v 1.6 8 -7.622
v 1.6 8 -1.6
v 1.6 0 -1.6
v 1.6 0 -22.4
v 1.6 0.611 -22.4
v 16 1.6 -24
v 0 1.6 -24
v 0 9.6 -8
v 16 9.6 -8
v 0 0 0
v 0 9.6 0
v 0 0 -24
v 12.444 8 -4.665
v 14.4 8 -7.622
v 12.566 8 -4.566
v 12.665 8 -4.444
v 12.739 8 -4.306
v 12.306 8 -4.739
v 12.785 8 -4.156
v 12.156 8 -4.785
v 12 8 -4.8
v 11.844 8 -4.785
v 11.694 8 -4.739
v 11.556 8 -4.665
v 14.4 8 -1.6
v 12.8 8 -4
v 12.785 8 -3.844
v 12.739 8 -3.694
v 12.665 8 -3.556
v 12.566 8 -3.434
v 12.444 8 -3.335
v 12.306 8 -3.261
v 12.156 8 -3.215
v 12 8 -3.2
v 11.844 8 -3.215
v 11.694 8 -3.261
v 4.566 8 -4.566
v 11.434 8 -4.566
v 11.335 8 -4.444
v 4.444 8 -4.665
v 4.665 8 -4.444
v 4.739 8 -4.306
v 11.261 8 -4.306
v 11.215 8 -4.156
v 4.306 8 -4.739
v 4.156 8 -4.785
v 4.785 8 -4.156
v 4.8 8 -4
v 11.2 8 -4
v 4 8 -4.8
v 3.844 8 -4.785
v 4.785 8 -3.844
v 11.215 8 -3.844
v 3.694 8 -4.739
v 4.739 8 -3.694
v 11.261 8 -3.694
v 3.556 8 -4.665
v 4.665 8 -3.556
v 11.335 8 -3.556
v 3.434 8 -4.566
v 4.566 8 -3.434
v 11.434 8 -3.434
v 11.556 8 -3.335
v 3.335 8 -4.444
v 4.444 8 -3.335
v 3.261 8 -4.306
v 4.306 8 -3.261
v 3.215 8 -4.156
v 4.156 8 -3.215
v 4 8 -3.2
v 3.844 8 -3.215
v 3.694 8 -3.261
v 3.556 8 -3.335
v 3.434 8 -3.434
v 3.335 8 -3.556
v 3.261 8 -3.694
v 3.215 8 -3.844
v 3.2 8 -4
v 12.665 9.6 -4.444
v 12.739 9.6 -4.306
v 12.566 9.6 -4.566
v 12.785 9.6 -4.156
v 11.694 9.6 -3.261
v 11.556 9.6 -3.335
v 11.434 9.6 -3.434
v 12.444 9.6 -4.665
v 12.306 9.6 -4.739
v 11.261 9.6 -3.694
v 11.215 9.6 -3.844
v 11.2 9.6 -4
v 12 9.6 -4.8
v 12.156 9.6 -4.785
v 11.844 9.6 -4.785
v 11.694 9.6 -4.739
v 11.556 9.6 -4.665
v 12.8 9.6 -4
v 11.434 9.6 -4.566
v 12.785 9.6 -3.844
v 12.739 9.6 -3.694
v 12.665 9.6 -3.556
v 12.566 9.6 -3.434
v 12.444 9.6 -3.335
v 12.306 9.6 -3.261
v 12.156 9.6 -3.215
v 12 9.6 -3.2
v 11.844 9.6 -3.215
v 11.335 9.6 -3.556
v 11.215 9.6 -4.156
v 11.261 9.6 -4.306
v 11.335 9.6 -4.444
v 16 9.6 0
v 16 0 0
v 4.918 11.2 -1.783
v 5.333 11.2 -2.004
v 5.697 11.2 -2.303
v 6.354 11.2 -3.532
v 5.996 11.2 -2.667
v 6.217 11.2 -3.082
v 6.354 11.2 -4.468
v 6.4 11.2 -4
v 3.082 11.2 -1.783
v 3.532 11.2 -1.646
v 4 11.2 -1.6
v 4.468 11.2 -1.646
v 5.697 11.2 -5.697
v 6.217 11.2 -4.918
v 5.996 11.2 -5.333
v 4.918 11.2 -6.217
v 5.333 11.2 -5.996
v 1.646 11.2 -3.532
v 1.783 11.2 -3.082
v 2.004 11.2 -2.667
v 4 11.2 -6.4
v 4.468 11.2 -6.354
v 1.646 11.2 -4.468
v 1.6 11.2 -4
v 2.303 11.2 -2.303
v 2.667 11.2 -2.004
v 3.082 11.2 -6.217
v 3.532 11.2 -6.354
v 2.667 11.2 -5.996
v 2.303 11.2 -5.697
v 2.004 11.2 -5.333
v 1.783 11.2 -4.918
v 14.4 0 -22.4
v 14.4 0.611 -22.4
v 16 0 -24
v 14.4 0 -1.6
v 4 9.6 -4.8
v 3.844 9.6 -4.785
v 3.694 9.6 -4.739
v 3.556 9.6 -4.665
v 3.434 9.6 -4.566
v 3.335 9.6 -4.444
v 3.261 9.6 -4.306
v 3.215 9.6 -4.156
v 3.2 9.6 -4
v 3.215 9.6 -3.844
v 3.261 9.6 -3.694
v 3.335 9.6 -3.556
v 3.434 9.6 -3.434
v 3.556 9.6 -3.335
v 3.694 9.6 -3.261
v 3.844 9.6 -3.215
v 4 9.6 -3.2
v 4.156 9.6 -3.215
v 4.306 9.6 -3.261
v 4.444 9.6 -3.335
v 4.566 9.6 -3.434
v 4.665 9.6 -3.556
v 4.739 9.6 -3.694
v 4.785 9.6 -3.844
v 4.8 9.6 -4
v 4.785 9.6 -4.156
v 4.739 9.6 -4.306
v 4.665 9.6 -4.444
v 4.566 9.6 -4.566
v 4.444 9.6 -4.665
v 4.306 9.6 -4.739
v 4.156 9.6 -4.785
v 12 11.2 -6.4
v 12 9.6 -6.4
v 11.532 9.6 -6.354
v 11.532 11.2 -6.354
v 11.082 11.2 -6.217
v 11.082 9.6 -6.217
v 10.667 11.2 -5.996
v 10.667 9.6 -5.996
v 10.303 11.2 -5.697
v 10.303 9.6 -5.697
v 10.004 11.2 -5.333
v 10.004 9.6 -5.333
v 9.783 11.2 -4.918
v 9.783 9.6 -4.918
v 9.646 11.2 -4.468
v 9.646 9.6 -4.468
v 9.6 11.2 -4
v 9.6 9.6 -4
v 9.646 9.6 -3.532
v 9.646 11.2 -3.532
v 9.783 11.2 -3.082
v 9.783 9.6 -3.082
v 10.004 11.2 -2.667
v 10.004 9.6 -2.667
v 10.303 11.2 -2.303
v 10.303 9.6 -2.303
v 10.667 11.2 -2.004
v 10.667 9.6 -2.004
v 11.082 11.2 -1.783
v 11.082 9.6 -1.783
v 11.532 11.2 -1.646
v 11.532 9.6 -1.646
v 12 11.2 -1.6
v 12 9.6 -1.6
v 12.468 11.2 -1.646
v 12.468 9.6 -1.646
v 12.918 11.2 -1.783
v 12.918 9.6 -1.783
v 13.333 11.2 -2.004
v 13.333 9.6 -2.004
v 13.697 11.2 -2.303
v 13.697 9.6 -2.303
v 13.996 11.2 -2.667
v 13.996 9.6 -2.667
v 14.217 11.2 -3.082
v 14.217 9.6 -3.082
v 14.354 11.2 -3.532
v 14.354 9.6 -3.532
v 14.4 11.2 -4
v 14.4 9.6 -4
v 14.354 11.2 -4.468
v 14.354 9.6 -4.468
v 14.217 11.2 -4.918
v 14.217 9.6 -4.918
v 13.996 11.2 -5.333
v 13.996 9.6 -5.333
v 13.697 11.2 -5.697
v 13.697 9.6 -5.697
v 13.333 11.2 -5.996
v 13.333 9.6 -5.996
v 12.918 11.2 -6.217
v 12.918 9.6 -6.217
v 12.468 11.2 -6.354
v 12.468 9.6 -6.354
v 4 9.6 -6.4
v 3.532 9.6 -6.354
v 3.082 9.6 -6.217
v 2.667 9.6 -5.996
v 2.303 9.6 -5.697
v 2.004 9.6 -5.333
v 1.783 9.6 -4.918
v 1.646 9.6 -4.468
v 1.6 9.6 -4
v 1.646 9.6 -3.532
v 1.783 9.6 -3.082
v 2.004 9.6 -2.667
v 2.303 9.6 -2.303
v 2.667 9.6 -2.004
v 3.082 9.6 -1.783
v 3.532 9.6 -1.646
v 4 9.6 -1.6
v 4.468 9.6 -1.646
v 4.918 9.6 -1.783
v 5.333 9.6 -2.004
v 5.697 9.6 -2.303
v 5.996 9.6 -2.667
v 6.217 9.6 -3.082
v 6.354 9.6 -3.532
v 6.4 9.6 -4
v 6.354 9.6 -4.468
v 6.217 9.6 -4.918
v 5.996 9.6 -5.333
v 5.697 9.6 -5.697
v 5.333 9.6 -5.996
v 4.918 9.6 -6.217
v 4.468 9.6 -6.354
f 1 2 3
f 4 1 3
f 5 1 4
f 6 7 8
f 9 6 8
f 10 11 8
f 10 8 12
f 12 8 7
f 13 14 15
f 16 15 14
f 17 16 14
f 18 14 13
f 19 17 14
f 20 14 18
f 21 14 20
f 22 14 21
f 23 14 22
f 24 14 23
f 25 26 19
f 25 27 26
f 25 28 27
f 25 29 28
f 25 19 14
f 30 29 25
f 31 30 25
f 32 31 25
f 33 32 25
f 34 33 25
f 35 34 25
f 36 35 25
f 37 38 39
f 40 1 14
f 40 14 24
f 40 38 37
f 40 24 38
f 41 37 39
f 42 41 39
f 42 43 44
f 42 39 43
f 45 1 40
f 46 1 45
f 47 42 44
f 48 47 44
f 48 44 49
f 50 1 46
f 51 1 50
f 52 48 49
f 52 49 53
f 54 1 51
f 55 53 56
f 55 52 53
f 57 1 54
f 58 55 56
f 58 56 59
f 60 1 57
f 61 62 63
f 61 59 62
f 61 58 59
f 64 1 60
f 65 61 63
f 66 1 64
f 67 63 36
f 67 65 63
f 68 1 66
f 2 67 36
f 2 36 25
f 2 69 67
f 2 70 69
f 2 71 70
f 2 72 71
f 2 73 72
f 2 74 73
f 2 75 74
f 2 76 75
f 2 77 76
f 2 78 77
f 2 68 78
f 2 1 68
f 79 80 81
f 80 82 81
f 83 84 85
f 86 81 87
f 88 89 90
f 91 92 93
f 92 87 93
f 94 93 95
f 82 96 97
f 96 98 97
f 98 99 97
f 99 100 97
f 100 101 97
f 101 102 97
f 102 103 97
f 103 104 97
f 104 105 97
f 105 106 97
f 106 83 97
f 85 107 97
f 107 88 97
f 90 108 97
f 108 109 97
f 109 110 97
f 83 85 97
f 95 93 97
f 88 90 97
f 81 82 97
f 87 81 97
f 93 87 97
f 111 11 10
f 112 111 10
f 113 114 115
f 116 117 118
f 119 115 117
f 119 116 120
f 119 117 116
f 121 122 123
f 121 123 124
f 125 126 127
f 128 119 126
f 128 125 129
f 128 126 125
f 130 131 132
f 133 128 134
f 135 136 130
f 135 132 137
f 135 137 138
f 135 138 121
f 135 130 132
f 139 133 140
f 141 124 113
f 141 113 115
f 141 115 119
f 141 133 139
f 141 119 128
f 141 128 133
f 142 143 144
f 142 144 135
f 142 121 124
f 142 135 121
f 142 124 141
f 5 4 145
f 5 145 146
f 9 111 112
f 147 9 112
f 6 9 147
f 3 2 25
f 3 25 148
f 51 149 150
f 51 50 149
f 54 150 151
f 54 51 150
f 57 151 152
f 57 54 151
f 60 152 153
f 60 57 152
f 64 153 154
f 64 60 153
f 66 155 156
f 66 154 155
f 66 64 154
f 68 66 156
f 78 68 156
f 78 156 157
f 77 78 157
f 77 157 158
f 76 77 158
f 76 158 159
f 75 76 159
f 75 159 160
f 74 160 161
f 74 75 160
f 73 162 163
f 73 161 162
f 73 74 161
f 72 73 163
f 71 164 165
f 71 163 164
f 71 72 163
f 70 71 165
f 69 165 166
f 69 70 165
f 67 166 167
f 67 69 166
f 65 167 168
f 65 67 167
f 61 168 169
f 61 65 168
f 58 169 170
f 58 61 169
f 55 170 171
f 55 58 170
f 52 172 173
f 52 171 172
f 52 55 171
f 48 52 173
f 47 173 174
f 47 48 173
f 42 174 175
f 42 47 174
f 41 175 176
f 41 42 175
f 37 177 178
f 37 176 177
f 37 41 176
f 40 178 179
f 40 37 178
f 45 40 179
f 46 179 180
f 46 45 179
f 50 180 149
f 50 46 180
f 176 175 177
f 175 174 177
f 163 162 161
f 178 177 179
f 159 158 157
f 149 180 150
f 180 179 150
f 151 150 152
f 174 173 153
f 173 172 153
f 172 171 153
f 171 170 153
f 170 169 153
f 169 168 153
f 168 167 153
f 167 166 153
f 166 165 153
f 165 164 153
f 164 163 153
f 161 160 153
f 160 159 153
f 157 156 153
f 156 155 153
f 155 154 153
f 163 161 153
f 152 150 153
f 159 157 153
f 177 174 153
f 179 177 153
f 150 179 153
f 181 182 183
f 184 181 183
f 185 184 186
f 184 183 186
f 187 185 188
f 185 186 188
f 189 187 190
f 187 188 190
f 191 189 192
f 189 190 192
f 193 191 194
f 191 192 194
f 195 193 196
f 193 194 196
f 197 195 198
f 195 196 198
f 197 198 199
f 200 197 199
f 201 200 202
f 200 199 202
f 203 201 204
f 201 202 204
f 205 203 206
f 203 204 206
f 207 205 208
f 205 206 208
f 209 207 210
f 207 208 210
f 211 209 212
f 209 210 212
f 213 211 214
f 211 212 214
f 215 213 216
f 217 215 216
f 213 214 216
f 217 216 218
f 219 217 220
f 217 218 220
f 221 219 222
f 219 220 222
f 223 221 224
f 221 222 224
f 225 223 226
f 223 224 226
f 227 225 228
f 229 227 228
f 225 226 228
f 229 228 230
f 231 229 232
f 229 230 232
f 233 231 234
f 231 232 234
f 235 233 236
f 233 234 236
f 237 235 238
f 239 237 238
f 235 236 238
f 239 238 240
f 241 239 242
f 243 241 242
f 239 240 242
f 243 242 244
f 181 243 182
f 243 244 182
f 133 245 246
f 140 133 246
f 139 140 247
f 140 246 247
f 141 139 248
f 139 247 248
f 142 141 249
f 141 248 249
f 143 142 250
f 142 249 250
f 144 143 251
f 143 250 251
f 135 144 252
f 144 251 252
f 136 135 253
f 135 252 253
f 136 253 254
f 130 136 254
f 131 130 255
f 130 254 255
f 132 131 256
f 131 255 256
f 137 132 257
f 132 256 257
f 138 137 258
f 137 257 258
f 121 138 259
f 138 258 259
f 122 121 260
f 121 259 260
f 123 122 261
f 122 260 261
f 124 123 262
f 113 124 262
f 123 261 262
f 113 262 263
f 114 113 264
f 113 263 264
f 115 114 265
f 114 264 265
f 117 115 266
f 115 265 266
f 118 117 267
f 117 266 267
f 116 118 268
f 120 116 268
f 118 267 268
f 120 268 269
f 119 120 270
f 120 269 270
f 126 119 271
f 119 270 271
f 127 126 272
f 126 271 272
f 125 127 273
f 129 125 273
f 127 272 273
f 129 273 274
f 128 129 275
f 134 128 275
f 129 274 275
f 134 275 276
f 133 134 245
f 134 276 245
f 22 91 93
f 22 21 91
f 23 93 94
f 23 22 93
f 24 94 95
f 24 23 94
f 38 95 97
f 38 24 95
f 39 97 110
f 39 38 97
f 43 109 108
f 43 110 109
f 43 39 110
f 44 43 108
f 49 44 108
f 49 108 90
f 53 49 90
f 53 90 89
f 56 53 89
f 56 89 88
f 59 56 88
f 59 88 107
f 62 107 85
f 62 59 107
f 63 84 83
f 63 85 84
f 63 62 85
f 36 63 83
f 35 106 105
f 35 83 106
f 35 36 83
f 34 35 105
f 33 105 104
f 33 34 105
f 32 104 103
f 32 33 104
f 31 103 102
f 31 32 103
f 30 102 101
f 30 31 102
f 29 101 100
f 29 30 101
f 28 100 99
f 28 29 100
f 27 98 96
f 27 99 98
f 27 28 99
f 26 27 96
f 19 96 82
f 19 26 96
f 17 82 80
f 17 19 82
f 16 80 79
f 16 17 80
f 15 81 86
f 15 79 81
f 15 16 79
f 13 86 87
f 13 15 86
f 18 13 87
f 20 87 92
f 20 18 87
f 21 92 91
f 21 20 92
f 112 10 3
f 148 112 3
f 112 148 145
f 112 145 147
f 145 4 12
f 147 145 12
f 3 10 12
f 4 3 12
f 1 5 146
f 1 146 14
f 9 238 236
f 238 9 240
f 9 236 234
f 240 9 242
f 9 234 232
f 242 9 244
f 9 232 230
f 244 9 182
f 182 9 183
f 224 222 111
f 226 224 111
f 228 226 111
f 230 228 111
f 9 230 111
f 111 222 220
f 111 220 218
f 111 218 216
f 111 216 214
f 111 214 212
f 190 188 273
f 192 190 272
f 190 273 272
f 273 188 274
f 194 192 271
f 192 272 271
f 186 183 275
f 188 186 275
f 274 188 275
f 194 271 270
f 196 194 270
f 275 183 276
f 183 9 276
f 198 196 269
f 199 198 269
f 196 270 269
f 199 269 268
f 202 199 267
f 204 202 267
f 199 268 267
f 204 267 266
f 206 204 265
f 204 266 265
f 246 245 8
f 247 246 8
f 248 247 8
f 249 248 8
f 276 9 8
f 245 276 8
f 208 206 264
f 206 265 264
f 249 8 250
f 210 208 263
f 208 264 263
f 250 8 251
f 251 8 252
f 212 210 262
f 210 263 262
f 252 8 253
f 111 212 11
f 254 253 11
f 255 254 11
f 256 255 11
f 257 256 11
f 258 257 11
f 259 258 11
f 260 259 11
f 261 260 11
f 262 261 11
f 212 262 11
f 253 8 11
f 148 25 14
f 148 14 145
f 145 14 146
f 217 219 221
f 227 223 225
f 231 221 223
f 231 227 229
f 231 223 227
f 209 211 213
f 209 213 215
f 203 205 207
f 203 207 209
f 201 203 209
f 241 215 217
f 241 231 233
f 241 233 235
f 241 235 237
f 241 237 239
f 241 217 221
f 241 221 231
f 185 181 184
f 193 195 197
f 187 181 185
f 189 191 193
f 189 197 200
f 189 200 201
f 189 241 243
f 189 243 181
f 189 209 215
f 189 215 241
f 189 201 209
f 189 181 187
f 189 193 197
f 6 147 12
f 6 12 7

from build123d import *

# Parameters (mm, degrees)
BOSS_EXTRUDE1_DEPTH = 16
SKETCH2_R           = 2.4
BOSS_EXTRUDE2_DEPTH = 1.6
SHELL1_T            = -1.6


with BuildPart() as part:
    # Sketch1 → Boss-Extrude1 (new body)
    with BuildSketch(Plane(origin=(0, 0, 0), x_dir=(0, 0, -1), z_dir=(1, 0, 0))):
        Polygon((0, 0), (24, 0), (24, 1.6), (8, 9.6), (0, 9.6), align=None)
    extrude(amount=BOSS_EXTRUDE1_DEPTH)

    # Sketch2 → Boss-Extrude2 (add)
    with BuildSketch(Plane(origin=(0, 9.6, 0), x_dir=(1, 0, 0), z_dir=(0, 1, 0))):
        with Locations(Location((4, 4, 0), (0, 0, 90))):
            Circle(SKETCH2_R)
        with Locations(Location((12, 4, 0), (0, 0, 90))):
            Circle(SKETCH2_R)
    extrude(amount=BOSS_EXTRUDE2_DEPTH)

    # Shell1
    shell1_openings = [part.faces().sort_by_distance(p)[0] for p in [
        (8, 0, -12),
    ]]
    offset(amount=SHELL1_T, openings=shell1_openings, kind=Kind.INTERSECTION)


solid = part.part
